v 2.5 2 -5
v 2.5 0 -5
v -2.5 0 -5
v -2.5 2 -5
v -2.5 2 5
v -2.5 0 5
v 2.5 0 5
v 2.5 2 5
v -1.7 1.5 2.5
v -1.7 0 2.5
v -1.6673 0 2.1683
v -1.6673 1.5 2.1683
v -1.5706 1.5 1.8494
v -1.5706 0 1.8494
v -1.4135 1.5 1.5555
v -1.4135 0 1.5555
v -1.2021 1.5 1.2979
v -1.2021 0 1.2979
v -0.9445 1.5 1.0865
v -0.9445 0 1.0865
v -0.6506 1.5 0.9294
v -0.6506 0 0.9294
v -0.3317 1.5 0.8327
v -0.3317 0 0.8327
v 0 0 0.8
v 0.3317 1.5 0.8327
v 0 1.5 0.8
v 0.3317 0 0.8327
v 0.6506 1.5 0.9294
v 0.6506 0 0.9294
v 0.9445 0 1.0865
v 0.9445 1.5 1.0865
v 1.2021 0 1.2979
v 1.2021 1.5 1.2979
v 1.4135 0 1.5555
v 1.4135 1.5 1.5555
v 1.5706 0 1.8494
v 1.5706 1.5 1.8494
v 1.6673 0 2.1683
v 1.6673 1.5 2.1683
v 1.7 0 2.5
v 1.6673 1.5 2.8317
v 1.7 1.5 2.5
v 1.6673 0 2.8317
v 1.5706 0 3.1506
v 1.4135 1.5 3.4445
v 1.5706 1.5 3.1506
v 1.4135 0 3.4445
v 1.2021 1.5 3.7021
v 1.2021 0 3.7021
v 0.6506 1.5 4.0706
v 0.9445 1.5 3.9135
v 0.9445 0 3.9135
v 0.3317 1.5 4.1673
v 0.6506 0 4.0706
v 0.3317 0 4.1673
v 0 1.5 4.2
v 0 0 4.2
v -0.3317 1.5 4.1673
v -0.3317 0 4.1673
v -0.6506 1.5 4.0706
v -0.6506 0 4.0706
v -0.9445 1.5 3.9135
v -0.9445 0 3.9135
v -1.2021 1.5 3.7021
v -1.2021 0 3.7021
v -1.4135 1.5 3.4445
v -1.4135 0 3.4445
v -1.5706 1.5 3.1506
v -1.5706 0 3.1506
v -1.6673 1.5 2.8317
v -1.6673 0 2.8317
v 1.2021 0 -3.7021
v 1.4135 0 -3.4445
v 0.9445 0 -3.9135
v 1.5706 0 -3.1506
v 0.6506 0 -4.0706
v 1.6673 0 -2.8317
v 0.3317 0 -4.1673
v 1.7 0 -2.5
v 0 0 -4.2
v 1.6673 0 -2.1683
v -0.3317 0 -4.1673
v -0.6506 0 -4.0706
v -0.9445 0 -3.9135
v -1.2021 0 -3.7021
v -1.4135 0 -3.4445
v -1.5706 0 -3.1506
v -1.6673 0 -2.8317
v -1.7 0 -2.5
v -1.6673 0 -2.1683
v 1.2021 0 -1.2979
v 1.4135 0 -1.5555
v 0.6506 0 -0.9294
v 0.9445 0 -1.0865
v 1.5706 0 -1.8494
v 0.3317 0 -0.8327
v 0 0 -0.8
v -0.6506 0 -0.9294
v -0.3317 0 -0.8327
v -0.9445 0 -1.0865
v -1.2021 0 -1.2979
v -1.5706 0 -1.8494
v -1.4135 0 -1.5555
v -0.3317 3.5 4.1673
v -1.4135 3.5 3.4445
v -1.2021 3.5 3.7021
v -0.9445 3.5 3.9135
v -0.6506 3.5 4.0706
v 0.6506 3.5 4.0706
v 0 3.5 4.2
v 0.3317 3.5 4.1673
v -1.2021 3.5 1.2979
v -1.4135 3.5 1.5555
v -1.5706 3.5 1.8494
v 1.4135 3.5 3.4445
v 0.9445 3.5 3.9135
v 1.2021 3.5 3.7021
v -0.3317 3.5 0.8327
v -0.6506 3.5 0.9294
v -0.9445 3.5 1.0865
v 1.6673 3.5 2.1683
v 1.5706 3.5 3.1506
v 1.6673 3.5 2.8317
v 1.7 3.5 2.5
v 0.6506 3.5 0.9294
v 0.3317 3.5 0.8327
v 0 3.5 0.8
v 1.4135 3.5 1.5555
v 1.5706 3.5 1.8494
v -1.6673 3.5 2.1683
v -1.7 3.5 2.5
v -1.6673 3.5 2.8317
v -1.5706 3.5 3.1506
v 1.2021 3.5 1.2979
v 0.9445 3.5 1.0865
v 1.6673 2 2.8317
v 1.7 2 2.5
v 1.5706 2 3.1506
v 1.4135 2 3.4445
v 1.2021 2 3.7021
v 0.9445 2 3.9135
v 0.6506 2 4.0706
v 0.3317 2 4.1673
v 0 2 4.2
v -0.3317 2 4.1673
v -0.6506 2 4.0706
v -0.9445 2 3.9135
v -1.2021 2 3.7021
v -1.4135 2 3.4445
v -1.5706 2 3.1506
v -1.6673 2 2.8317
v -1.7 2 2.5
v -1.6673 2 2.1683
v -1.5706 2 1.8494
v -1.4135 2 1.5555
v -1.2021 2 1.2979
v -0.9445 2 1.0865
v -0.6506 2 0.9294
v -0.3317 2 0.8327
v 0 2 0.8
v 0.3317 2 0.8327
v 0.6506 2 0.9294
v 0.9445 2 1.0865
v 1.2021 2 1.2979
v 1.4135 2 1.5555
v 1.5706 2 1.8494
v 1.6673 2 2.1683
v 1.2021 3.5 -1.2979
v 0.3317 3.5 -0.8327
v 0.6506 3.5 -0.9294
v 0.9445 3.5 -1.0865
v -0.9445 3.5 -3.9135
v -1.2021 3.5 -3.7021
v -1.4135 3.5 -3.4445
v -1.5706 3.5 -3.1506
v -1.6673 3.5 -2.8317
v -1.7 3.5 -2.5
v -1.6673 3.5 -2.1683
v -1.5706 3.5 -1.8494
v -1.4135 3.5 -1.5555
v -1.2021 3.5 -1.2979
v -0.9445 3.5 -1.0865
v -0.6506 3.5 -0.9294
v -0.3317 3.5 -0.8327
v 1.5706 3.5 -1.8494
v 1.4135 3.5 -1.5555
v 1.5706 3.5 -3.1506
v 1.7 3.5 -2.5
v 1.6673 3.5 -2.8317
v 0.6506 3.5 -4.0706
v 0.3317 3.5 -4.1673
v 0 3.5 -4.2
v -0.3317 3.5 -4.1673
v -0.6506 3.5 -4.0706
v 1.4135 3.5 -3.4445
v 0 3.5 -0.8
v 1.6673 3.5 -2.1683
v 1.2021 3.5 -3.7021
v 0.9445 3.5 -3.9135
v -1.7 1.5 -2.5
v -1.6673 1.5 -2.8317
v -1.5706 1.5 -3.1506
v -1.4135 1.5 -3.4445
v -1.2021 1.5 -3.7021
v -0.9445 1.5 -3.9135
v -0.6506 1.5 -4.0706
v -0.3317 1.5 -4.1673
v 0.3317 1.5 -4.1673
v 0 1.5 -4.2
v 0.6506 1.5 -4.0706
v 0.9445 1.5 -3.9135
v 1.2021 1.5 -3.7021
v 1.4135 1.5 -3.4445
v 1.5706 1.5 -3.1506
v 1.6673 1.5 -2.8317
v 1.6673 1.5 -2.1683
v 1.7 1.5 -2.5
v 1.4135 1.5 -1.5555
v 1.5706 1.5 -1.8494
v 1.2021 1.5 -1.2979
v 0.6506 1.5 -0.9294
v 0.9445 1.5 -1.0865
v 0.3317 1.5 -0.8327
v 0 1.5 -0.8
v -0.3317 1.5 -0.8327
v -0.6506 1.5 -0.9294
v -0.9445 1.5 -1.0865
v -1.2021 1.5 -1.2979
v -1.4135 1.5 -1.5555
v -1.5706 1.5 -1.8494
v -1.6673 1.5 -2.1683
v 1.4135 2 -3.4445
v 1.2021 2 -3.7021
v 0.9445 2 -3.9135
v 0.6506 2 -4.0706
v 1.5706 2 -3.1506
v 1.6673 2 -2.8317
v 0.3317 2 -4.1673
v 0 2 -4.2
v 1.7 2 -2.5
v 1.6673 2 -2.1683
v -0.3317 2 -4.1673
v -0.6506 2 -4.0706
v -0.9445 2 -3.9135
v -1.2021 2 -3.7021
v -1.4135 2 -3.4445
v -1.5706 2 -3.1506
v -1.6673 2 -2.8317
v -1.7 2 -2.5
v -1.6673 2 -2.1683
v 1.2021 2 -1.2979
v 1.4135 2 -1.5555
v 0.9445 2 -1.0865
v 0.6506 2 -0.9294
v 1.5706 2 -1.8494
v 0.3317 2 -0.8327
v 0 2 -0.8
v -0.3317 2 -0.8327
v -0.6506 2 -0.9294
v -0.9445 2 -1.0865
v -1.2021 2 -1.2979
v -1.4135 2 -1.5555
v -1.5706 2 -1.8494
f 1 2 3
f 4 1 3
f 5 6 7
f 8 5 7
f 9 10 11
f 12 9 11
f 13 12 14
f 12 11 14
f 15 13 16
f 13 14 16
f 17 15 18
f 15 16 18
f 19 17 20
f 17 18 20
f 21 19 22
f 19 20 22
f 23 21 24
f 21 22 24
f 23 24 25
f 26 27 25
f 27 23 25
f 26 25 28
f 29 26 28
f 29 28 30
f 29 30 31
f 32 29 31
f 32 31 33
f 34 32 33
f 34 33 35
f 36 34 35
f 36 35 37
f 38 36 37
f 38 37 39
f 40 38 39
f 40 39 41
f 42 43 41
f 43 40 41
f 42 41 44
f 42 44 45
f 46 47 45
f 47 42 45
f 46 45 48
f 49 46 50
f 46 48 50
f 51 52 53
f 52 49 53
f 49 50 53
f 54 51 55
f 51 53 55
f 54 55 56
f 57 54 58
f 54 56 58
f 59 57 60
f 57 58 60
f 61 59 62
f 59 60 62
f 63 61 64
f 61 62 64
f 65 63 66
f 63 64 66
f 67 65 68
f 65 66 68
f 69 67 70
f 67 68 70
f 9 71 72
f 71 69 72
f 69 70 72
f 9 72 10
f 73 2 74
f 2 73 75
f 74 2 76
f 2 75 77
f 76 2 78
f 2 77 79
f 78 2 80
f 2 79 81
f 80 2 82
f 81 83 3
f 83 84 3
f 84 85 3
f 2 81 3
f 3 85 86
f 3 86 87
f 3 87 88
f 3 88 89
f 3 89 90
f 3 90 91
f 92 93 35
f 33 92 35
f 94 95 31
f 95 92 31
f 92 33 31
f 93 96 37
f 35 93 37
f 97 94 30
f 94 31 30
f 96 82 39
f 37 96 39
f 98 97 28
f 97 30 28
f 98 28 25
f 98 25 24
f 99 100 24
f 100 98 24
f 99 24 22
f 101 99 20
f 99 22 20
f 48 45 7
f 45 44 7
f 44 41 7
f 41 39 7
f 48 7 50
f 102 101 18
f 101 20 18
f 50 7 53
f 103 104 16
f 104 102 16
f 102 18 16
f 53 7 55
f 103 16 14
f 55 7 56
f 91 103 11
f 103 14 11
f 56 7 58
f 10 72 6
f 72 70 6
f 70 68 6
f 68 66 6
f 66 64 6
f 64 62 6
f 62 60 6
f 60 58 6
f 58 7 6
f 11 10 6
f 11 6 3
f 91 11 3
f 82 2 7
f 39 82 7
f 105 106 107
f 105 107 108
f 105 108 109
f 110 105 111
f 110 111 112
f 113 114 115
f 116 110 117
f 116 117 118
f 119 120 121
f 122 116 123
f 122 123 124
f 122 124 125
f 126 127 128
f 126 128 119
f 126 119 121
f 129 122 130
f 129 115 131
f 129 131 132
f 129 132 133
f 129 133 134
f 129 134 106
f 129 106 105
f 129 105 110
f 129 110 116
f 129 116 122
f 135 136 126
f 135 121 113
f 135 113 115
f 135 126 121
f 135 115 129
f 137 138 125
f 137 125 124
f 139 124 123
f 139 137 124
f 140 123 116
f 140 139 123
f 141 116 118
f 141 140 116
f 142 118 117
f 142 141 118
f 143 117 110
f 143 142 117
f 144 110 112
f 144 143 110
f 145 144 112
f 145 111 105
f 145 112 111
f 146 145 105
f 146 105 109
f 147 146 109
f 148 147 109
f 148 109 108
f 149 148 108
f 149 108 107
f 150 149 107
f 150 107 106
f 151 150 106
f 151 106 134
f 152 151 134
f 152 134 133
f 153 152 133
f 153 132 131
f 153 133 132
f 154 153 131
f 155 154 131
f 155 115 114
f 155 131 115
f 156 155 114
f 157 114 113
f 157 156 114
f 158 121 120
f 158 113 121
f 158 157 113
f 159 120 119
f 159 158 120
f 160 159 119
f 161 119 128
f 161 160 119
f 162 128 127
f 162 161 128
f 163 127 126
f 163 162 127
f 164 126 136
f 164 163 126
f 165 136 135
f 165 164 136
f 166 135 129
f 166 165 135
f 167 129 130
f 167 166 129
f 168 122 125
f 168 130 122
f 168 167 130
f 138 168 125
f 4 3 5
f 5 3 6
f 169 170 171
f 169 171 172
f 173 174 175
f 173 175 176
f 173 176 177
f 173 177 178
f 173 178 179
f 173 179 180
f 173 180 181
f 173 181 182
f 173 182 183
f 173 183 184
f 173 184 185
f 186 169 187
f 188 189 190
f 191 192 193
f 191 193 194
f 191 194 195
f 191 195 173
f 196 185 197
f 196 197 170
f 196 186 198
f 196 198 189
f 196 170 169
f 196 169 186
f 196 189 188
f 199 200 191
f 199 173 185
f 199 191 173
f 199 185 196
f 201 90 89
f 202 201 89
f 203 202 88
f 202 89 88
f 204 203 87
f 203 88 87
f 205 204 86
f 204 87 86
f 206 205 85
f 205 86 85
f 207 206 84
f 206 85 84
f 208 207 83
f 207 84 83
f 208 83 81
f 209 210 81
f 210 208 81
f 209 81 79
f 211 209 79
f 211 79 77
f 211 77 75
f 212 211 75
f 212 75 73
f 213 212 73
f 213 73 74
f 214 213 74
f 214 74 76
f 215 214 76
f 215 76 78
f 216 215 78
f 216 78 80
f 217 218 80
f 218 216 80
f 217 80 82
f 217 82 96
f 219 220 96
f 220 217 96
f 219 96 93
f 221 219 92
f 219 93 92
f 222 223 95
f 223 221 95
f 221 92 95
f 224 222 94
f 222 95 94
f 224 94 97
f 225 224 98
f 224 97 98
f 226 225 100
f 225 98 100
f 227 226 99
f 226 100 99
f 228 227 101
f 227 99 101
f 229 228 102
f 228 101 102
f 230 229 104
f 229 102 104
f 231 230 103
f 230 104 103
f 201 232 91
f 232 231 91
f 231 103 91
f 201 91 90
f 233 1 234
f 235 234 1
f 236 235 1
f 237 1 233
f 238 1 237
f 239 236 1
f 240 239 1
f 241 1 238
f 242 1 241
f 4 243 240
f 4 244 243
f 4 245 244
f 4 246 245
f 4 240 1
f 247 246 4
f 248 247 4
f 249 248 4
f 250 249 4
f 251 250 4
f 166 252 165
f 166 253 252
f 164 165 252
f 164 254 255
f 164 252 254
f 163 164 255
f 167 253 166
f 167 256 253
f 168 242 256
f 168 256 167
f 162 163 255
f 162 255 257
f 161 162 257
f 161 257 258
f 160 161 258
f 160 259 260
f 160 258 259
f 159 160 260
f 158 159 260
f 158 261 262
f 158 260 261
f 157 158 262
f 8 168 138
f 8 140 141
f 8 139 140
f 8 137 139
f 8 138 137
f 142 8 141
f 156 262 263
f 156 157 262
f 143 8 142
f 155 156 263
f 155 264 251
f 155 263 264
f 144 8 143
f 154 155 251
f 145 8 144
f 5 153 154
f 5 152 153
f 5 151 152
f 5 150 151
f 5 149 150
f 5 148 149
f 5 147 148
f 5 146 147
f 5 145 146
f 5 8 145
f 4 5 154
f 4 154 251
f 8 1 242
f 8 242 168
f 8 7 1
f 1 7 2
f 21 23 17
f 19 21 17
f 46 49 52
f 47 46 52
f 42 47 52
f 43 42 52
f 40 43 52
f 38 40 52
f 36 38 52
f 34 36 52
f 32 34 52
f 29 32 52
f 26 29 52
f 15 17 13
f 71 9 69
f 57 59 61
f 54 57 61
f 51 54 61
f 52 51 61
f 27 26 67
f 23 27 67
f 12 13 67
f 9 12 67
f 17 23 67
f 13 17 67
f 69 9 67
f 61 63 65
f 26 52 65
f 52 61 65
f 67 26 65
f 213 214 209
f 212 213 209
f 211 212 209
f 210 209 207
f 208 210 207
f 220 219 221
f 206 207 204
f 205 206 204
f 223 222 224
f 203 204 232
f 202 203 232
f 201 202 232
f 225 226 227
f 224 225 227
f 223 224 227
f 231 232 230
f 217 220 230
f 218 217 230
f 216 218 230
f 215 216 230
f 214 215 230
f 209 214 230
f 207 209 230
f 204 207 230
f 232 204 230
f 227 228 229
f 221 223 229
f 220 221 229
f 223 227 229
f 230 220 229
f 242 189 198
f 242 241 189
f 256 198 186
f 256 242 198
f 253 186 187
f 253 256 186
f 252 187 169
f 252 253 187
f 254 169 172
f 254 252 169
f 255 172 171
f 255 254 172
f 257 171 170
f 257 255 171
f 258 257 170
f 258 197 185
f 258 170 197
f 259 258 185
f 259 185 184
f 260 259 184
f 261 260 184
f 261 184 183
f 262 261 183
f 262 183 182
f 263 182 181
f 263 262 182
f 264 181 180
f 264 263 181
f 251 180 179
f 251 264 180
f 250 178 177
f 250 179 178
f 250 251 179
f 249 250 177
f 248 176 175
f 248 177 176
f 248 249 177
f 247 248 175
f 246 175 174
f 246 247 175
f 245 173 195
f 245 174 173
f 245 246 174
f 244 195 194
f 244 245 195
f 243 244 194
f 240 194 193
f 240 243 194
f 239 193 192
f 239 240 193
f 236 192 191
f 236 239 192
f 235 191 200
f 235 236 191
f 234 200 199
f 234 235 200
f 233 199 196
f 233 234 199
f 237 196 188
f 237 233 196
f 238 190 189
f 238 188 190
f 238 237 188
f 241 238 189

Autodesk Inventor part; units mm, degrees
ref_plane "YZ Plane" through (0, 0, 0) normal (1, 0, 0) x (0, 1, 0)
ref_plane "XZ Plane" through (0, 0, 0) normal (0, 1, 0) x (-1, 0, 0)
ref_plane "XY Plane" through (0, 0, 0) normal (0, 0, 1) x (1, 0, 0)
sketch "草圖1" plane through (0, 0, 0) normal (0, 1, 0) x (-1, 0, 0)
  line L0 (2.5, 5) -> (-2.5, 5)
  line L1 (-2.5, 5) -> (-2.5, -5)
  line L2 (-2.5, -5) -> (2.5, -5)
  line L3 (2.5, -5) -> (2.5, 5)
  circle A0 centre (0, 2.5) radius 1.7
  line L4 (2.5, 0) -> (-2.5, 0) construction
  circle A1 centre (0, -2.5) radius 1.7
  point P0 (0, 0)
  point P1 (0, -5)
  point P2 (0, 5)
  dimension "d0" = 5
  dimension "d1" = 10
  dimension "d2" = 3.4
  dimension "d3" = 2.5
extrude "擠出1" add sketch "草圖1" along normal blind 2 contours L3 L2 L1 L0 | A0 | A1
extrude "擠出2" cut sketch "草圖1" along normal blind 1.5 contours A0 | A1
sketch "草圖2" plane through (0, 2, 0) normal (0, 1, 0) x (1, 0, 0)
  circle A0 centre (0, -2.5) radius 1.7 projected
  circle A1 centre (0, 2.5) radius 1.7 projected
  point P0 (0, 0)
extrude "擠出3" add sketch "草圖2" along normal blind 1.5
properties part number "110033226_ipt_13_草地二"
